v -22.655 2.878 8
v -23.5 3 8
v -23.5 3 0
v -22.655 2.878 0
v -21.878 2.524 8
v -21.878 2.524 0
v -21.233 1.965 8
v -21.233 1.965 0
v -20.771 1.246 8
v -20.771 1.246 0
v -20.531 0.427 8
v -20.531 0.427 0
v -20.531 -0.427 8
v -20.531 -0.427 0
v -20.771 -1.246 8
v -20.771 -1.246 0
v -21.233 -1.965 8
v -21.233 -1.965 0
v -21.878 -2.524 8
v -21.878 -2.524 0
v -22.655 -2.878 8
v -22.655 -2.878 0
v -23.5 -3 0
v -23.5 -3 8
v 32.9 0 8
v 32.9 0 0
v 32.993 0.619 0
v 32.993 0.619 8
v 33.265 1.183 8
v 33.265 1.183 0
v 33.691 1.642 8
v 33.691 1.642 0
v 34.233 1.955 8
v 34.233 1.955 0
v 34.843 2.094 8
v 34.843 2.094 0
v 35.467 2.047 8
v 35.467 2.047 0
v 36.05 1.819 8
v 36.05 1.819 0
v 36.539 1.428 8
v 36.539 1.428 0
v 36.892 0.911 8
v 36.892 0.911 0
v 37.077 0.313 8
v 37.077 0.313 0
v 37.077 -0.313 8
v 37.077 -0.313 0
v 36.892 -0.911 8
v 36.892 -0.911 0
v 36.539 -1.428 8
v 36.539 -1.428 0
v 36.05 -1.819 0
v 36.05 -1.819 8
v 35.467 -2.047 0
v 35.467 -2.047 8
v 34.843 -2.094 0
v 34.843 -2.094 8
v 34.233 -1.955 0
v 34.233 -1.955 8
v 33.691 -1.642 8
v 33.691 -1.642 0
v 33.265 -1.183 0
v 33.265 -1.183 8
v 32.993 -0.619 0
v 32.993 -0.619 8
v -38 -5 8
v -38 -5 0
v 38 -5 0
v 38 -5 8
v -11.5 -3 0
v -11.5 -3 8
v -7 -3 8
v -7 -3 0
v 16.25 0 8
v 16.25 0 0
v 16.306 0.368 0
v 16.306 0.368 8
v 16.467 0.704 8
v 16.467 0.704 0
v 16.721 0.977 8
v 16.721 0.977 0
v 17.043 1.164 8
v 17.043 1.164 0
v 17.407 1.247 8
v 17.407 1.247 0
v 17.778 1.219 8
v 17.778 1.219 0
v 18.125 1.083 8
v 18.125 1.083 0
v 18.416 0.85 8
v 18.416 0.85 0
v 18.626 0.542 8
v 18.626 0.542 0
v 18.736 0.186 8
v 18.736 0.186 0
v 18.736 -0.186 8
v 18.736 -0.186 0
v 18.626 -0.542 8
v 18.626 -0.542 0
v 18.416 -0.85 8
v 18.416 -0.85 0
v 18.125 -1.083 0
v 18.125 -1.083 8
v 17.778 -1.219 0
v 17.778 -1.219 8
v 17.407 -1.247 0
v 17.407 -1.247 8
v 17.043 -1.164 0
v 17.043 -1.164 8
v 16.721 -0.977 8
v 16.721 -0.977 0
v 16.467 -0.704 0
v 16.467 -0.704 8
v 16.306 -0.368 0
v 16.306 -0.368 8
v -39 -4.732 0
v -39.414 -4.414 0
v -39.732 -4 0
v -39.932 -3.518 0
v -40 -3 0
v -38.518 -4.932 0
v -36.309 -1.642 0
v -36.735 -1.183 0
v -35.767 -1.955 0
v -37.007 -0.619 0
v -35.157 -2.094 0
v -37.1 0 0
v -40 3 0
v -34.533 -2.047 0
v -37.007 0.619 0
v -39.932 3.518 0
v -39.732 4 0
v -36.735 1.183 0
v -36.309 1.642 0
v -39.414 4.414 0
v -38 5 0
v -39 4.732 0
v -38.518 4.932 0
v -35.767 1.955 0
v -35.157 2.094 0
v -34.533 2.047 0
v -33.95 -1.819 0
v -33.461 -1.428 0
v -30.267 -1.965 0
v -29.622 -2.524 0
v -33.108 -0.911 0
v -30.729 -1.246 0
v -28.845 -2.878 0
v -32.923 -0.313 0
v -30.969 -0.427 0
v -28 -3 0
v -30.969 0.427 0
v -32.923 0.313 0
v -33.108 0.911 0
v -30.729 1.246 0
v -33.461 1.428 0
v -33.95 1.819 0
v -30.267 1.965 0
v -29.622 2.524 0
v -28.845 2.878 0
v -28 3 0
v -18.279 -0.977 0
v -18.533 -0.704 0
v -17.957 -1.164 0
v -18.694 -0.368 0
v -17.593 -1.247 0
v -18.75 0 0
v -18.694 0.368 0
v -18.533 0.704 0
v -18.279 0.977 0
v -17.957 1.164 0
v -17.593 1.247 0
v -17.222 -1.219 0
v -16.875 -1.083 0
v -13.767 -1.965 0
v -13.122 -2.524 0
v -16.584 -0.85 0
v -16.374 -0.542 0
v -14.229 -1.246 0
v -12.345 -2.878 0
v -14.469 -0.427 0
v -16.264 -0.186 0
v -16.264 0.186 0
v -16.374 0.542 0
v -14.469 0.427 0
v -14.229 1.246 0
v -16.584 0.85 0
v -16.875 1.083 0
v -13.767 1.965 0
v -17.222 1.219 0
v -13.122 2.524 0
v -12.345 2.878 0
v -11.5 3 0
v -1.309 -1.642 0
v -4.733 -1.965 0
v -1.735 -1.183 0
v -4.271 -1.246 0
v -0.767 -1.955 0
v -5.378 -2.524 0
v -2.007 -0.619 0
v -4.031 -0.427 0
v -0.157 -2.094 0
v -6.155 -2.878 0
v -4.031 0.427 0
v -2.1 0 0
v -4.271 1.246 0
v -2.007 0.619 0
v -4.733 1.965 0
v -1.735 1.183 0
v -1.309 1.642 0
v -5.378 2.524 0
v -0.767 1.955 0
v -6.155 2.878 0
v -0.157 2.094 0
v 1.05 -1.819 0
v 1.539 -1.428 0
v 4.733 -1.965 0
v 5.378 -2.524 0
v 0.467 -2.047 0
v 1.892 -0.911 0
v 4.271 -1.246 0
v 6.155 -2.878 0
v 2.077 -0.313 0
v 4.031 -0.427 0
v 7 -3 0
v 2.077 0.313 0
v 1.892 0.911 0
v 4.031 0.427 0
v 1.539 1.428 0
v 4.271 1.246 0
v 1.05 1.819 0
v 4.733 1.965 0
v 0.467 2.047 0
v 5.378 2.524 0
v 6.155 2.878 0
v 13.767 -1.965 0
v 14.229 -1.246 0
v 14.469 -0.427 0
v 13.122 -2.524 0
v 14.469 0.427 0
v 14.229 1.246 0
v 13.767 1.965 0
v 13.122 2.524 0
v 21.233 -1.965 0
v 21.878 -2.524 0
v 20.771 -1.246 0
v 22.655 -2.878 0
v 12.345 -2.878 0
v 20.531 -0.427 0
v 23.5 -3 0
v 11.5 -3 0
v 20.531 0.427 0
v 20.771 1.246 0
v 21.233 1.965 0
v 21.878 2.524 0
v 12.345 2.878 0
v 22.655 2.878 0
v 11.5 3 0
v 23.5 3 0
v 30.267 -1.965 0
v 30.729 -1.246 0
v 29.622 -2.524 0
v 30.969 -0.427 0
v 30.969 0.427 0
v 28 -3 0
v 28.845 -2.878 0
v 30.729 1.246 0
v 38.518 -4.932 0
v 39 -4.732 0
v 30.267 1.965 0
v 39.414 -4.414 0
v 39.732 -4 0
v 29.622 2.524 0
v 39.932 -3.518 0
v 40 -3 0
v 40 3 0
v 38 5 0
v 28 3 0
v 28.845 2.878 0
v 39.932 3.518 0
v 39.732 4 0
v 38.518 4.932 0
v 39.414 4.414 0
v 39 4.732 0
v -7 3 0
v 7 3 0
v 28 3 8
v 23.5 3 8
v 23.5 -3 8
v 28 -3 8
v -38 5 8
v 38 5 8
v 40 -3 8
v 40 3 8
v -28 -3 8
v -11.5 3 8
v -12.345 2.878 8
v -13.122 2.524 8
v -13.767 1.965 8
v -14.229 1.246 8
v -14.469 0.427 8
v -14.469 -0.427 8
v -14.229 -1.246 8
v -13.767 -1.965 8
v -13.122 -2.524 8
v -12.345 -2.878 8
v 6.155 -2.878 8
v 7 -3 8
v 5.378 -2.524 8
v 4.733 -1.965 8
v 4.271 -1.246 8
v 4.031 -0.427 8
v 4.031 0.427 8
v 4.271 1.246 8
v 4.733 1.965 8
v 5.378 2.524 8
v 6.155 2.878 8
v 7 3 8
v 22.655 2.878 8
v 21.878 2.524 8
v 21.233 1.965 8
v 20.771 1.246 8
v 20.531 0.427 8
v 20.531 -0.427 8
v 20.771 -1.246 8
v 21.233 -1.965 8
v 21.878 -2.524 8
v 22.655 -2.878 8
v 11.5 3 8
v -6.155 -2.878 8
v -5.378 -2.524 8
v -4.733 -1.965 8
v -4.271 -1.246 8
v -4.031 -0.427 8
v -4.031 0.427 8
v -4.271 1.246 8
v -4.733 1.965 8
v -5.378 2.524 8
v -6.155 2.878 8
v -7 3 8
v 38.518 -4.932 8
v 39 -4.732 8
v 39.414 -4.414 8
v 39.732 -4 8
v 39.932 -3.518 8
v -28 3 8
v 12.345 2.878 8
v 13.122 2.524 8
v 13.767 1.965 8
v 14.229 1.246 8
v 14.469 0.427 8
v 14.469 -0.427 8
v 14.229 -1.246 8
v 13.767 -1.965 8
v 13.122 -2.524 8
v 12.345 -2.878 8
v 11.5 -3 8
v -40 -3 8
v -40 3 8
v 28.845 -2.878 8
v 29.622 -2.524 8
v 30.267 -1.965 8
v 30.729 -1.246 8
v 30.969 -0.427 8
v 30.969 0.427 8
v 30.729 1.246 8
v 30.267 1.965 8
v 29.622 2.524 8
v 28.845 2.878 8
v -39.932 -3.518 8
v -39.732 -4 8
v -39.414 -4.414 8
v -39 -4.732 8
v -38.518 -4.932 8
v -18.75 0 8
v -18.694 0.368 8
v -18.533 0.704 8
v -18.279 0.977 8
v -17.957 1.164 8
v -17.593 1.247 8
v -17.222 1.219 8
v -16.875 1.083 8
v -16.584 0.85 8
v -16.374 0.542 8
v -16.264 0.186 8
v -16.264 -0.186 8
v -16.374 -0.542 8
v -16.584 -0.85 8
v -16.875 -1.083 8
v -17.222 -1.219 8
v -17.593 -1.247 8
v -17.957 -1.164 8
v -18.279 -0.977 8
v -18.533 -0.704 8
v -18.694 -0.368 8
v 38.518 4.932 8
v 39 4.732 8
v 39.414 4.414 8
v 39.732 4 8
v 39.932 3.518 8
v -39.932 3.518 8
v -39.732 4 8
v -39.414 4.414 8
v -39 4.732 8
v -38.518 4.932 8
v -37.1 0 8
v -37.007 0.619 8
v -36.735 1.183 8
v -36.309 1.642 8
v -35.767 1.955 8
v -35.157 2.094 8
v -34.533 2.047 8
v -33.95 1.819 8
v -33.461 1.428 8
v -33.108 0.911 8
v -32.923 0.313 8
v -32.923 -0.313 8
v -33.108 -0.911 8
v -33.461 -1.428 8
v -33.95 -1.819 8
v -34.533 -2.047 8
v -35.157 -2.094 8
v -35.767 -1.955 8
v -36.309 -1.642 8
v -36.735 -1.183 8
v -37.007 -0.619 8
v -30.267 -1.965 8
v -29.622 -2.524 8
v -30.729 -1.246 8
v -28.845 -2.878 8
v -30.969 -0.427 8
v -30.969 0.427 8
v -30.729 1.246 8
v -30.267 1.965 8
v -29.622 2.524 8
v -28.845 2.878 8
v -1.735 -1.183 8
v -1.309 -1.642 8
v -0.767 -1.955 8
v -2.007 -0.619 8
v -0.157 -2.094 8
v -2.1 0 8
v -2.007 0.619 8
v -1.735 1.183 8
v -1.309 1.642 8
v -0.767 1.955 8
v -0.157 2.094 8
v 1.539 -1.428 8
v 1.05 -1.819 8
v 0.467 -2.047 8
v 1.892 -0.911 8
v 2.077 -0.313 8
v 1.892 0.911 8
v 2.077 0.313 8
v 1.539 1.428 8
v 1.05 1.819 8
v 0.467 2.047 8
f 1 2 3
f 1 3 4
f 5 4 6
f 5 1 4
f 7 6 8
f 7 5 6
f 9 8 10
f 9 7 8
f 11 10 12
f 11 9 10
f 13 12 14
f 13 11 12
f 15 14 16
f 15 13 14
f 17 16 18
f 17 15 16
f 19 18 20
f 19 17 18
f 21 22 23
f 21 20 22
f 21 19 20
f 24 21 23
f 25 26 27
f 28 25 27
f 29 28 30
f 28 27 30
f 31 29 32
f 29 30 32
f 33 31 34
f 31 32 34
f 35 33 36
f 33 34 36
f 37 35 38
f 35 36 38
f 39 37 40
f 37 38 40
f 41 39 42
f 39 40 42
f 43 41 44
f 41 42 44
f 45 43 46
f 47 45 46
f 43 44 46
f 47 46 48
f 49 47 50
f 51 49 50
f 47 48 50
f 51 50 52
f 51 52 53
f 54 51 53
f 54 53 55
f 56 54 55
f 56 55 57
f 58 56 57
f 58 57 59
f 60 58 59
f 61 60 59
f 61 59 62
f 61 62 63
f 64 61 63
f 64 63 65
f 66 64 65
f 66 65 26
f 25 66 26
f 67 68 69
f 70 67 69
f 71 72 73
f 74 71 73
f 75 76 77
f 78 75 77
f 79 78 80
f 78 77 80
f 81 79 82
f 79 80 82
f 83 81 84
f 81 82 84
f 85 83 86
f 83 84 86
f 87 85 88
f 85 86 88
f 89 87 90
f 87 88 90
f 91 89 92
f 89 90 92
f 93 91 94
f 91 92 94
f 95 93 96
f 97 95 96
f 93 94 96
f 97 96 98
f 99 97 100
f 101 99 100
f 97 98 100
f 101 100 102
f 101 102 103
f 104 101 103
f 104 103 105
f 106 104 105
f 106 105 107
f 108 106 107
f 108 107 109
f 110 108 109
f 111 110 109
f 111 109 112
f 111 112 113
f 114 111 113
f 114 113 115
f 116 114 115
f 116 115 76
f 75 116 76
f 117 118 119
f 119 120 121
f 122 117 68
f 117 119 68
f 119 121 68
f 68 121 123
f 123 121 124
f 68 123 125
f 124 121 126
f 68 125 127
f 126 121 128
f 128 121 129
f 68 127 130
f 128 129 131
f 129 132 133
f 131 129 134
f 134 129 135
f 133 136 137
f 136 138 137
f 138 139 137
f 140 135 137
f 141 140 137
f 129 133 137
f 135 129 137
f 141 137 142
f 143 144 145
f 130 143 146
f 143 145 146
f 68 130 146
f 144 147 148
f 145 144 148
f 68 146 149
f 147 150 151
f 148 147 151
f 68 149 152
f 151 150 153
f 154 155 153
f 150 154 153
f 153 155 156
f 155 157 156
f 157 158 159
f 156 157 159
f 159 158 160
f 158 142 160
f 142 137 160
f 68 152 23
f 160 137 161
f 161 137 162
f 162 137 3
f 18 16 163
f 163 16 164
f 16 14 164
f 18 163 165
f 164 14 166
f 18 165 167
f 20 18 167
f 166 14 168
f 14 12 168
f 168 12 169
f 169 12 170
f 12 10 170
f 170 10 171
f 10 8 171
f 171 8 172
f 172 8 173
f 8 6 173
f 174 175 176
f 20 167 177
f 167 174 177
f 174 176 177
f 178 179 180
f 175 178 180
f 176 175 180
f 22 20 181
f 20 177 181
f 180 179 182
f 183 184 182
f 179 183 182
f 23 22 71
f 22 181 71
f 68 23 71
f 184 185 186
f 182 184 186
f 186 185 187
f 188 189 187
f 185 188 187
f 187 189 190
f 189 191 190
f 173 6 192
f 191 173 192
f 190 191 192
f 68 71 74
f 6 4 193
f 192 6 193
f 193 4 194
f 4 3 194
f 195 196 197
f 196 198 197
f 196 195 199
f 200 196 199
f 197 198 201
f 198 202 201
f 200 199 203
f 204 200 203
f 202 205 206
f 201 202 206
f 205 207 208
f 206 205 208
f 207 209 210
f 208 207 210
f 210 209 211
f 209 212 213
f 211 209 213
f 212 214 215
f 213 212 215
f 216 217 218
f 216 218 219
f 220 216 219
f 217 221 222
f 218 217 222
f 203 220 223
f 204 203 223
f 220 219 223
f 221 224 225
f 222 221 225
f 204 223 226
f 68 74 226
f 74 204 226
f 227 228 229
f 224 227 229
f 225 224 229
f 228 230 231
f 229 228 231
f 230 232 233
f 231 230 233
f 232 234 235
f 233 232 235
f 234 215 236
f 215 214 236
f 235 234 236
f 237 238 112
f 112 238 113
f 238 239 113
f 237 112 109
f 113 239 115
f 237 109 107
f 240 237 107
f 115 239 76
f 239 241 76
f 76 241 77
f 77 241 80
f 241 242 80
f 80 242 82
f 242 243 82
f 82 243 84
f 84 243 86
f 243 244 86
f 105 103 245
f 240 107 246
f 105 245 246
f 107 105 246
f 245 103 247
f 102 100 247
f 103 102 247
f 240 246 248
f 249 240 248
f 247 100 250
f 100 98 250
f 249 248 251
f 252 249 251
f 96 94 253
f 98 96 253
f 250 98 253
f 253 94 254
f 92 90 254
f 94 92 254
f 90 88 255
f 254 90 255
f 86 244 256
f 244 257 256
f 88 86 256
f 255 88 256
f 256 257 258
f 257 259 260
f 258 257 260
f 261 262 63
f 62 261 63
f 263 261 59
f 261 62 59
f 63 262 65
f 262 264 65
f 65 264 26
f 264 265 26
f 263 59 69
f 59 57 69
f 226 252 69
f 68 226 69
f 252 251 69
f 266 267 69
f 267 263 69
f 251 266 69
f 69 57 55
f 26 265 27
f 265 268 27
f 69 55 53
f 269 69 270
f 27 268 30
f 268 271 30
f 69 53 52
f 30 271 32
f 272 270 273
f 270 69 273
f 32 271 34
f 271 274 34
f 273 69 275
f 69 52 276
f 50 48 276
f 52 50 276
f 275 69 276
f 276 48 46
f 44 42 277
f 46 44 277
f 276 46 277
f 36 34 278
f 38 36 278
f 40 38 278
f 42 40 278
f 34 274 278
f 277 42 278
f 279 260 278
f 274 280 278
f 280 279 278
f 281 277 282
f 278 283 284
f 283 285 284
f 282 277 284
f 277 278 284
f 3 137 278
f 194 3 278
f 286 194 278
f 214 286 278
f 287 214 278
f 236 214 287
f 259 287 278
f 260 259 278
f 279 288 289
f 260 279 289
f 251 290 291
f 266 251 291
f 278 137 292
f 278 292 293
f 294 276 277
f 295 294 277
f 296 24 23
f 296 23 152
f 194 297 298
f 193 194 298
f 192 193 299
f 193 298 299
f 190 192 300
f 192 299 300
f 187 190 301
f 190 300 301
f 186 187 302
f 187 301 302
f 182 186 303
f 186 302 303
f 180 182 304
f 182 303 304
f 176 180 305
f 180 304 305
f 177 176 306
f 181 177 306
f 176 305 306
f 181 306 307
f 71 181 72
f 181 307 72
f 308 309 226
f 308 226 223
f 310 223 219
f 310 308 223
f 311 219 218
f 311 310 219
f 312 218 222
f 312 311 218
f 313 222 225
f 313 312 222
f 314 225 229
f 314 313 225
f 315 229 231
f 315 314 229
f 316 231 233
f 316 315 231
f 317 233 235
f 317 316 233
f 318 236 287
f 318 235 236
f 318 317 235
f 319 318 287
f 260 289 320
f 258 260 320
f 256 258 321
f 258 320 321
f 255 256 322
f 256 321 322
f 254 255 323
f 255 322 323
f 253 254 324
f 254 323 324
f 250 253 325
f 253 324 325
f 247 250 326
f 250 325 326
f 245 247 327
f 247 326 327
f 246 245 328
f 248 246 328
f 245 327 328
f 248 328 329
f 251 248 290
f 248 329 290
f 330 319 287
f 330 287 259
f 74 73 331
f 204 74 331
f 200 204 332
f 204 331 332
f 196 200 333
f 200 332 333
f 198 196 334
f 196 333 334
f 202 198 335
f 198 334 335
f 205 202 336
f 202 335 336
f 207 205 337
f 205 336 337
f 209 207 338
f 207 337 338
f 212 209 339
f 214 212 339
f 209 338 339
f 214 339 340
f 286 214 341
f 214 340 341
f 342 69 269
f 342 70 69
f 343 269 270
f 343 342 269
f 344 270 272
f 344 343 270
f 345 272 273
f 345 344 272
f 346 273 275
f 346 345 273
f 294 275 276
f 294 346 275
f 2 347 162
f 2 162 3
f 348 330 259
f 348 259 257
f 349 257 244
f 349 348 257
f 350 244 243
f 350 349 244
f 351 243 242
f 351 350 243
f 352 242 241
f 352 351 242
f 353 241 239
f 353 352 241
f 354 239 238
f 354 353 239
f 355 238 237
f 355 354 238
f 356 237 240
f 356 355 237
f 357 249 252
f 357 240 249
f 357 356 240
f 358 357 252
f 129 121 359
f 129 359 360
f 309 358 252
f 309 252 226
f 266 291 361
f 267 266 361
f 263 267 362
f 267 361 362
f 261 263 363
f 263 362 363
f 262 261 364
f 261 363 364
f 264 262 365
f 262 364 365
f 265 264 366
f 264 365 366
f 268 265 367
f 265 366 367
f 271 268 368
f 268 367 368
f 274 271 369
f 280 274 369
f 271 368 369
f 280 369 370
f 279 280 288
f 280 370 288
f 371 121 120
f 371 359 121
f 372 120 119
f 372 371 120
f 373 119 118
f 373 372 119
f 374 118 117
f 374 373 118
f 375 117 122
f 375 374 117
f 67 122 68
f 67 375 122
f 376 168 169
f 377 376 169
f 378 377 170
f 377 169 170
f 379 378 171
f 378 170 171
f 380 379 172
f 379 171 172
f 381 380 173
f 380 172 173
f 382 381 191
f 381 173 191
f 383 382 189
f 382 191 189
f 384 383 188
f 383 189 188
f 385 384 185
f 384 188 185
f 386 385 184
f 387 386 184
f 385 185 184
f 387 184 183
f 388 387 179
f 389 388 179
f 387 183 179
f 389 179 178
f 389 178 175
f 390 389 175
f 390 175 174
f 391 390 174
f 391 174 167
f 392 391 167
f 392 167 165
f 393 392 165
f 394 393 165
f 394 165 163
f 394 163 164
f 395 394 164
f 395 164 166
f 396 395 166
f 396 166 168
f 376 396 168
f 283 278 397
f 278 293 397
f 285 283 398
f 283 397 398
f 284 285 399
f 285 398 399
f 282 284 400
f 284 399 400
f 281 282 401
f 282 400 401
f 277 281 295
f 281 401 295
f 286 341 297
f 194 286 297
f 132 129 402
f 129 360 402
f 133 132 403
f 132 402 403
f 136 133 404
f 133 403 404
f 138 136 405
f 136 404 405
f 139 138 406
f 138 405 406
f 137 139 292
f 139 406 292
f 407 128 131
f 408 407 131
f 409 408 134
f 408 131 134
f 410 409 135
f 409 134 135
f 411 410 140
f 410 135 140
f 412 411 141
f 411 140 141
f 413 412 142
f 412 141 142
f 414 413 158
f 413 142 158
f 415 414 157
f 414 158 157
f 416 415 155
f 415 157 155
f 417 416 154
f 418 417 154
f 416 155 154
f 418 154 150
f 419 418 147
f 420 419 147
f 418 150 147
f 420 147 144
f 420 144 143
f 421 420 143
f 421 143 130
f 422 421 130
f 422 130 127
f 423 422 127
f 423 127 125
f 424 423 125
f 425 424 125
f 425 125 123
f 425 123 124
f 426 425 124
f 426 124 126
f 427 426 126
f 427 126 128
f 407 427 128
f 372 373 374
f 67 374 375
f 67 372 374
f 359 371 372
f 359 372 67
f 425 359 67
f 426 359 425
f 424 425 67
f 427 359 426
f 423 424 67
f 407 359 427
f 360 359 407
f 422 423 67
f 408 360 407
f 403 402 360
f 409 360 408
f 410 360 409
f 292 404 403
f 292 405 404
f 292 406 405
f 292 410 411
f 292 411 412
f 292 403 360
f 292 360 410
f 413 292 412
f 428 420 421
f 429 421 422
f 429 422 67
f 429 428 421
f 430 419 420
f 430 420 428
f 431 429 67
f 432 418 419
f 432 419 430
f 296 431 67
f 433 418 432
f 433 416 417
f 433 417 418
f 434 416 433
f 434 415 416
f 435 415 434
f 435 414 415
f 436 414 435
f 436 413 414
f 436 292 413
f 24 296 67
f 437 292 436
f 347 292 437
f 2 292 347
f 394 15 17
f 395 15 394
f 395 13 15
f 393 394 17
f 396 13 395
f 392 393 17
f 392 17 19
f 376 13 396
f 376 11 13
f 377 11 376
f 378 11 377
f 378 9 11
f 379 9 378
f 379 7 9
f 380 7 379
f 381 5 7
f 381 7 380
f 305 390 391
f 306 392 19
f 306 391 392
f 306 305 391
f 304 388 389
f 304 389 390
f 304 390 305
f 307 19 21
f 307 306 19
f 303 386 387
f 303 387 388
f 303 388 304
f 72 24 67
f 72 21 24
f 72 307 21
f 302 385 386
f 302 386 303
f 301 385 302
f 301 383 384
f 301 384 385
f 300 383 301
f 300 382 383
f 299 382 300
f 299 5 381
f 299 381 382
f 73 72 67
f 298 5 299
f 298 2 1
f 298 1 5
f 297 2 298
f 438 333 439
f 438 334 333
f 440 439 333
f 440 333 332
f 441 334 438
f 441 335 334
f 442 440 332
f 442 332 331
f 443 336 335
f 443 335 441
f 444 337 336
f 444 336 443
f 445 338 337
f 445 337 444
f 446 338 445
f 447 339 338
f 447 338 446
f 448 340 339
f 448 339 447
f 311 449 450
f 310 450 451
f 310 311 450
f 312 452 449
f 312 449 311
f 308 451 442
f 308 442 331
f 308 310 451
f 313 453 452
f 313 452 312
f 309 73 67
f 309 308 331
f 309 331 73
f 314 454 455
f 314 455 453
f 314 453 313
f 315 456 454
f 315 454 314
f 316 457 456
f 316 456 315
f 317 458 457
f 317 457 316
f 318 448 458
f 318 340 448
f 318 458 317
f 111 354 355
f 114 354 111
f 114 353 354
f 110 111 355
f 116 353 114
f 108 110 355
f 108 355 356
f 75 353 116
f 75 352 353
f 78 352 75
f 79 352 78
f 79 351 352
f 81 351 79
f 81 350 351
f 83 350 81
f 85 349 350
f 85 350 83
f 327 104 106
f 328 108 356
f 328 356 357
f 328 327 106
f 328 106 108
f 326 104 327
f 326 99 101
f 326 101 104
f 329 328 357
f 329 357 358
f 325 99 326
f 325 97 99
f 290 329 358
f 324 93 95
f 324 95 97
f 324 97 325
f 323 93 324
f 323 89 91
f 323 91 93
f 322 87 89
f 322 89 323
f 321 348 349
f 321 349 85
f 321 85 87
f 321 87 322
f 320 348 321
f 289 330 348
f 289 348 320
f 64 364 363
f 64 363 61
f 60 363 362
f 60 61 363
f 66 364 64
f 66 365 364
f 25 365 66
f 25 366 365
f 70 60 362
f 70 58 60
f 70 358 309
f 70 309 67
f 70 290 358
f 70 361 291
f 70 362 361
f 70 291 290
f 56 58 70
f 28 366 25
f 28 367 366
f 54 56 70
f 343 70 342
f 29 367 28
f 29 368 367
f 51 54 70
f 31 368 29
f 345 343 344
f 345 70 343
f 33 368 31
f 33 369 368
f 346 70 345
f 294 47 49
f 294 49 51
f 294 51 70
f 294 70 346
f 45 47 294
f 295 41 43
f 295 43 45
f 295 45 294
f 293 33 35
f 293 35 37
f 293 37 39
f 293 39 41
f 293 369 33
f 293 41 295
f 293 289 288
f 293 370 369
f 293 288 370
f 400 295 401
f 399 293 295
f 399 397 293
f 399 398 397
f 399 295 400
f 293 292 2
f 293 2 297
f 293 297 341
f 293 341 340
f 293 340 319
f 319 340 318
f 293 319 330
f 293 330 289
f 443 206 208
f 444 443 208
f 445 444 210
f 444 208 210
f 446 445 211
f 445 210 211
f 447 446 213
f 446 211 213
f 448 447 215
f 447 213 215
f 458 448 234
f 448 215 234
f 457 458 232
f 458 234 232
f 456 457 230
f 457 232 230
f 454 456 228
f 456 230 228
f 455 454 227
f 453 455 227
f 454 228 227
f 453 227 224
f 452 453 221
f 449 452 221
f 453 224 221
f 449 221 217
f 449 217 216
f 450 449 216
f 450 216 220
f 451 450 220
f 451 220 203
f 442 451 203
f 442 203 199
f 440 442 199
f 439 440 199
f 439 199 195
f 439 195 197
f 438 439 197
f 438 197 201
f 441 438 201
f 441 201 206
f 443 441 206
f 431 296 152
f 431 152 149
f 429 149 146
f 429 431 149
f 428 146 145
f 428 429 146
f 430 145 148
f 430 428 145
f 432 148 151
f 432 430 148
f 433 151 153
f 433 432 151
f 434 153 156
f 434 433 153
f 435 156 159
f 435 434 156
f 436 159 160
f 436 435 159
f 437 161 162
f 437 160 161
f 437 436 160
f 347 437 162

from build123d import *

# Parameters (mm, degrees)
SKETCH_1_W             = 80
SKETCH_1_H             = 10
EXTRUDE_1_DEPTH        = 8
HOLE_WIZARD_M5_1_D     = 4.2
HOLE_WIZARD_M5_1_DEPTH = 12.4
HOLE_WIZARD_M5_1_TIP   = 1.2618073
HOLE_WIZARD_M3_1_D     = 2.5
HOLE_WIZARD_M3_1_DEPTH = 17.5
HOLE_WIZARD_M3_1_TIP   = 0.751075774
FILLET_1_R             = 2
CUT_EXTRUDE_1_DEPTH    = 36


with BuildPart() as part:
    # 草图1 → 凸台-拉伸1 (new body)
    with BuildSketch(Plane.XY):
        Rectangle(SKETCH_1_W, SKETCH_1_H)
    extrude(amount=EXTRUDE_1_DEPTH)

    # M5 螺纹孔1
    with Locations(Plane.XY.offset(8)):
        with Locations((-35, 0), (0, 0), (35, 0)):
            Hole(HOLE_WIZARD_M5_1_D / 2, depth=HOLE_WIZARD_M5_1_DEPTH)
            with Locations((0, 0, -(HOLE_WIZARD_M5_1_DEPTH + HOLE_WIZARD_M5_1_TIP / 2))):  # 118° drill point
                Cone(0, HOLE_WIZARD_M5_1_D / 2, HOLE_WIZARD_M5_1_TIP, mode=Mode.SUBTRACT)

    # M3 螺纹孔1
    with Locations(Plane.XY.offset(8)):
        with Locations((-17.5, 0), (17.5, 0)):
            Hole(HOLE_WIZARD_M3_1_D / 2, depth=HOLE_WIZARD_M3_1_DEPTH)
            with Locations((0, 0, -(HOLE_WIZARD_M3_1_DEPTH + HOLE_WIZARD_M3_1_TIP / 2))):  # 118° drill point
                Cone(0, HOLE_WIZARD_M3_1_D / 2, HOLE_WIZARD_M3_1_TIP, mode=Mode.SUBTRACT)

    # 圆角1
    fillet_1_edges = [part.edges().sort_by_distance(p)[0] for p in [
        (40, -5, 4),
        (-40, -5, 4),
        (-40, 5, 4),
        (40, 5, 4),
    ]]
    fillet(fillet_1_edges, radius=FILLET_1_R)

    # 草图8 → 切除-拉伸1 (cut)
    with BuildSketch(Plane.XY.offset(8)):
        with BuildLine():
            Line((-28, 3), (-23.5, 3))
            ThreePointArc((-23.5, 3), (-20.5, 0), (-23.5, -3))
            Line((-23.5, -3), (-28, -3))
            ThreePointArc((-28, -3), (-31, 0), (-28, 3))
        make_face()
        with BuildLine():
            Line((-7, 3), (-11.5, 3))
            ThreePointArc((-11.5, 3), (-14.5, 0), (-11.5, -3))
            Line((-11.5, -3), (-7, -3))
            ThreePointArc((-7, -3), (-4, 0), (-7, 3))
        make_face()
        with BuildLine():
            Line((7, 3), (11.5, 3))
            ThreePointArc((11.5, 3), (14.5, 0), (11.5, -3))
            Line((11.5, -3), (7, -3))
            ThreePointArc((7, -3), (4, 0), (7, 3))
        make_face()
        with BuildLine():
            Line((28, 3), (23.5, 3))
            ThreePointArc((23.5, 3), (20.5, 0), (23.5, -3))
            Line((23.5, -3), (28, -3))
            ThreePointArc((28, -3), (31, 0), (28, 3))
        make_face()
    extrude(amount=-CUT_EXTRUDE_1_DEPTH, mode=Mode.SUBTRACT)


solid = part.part
